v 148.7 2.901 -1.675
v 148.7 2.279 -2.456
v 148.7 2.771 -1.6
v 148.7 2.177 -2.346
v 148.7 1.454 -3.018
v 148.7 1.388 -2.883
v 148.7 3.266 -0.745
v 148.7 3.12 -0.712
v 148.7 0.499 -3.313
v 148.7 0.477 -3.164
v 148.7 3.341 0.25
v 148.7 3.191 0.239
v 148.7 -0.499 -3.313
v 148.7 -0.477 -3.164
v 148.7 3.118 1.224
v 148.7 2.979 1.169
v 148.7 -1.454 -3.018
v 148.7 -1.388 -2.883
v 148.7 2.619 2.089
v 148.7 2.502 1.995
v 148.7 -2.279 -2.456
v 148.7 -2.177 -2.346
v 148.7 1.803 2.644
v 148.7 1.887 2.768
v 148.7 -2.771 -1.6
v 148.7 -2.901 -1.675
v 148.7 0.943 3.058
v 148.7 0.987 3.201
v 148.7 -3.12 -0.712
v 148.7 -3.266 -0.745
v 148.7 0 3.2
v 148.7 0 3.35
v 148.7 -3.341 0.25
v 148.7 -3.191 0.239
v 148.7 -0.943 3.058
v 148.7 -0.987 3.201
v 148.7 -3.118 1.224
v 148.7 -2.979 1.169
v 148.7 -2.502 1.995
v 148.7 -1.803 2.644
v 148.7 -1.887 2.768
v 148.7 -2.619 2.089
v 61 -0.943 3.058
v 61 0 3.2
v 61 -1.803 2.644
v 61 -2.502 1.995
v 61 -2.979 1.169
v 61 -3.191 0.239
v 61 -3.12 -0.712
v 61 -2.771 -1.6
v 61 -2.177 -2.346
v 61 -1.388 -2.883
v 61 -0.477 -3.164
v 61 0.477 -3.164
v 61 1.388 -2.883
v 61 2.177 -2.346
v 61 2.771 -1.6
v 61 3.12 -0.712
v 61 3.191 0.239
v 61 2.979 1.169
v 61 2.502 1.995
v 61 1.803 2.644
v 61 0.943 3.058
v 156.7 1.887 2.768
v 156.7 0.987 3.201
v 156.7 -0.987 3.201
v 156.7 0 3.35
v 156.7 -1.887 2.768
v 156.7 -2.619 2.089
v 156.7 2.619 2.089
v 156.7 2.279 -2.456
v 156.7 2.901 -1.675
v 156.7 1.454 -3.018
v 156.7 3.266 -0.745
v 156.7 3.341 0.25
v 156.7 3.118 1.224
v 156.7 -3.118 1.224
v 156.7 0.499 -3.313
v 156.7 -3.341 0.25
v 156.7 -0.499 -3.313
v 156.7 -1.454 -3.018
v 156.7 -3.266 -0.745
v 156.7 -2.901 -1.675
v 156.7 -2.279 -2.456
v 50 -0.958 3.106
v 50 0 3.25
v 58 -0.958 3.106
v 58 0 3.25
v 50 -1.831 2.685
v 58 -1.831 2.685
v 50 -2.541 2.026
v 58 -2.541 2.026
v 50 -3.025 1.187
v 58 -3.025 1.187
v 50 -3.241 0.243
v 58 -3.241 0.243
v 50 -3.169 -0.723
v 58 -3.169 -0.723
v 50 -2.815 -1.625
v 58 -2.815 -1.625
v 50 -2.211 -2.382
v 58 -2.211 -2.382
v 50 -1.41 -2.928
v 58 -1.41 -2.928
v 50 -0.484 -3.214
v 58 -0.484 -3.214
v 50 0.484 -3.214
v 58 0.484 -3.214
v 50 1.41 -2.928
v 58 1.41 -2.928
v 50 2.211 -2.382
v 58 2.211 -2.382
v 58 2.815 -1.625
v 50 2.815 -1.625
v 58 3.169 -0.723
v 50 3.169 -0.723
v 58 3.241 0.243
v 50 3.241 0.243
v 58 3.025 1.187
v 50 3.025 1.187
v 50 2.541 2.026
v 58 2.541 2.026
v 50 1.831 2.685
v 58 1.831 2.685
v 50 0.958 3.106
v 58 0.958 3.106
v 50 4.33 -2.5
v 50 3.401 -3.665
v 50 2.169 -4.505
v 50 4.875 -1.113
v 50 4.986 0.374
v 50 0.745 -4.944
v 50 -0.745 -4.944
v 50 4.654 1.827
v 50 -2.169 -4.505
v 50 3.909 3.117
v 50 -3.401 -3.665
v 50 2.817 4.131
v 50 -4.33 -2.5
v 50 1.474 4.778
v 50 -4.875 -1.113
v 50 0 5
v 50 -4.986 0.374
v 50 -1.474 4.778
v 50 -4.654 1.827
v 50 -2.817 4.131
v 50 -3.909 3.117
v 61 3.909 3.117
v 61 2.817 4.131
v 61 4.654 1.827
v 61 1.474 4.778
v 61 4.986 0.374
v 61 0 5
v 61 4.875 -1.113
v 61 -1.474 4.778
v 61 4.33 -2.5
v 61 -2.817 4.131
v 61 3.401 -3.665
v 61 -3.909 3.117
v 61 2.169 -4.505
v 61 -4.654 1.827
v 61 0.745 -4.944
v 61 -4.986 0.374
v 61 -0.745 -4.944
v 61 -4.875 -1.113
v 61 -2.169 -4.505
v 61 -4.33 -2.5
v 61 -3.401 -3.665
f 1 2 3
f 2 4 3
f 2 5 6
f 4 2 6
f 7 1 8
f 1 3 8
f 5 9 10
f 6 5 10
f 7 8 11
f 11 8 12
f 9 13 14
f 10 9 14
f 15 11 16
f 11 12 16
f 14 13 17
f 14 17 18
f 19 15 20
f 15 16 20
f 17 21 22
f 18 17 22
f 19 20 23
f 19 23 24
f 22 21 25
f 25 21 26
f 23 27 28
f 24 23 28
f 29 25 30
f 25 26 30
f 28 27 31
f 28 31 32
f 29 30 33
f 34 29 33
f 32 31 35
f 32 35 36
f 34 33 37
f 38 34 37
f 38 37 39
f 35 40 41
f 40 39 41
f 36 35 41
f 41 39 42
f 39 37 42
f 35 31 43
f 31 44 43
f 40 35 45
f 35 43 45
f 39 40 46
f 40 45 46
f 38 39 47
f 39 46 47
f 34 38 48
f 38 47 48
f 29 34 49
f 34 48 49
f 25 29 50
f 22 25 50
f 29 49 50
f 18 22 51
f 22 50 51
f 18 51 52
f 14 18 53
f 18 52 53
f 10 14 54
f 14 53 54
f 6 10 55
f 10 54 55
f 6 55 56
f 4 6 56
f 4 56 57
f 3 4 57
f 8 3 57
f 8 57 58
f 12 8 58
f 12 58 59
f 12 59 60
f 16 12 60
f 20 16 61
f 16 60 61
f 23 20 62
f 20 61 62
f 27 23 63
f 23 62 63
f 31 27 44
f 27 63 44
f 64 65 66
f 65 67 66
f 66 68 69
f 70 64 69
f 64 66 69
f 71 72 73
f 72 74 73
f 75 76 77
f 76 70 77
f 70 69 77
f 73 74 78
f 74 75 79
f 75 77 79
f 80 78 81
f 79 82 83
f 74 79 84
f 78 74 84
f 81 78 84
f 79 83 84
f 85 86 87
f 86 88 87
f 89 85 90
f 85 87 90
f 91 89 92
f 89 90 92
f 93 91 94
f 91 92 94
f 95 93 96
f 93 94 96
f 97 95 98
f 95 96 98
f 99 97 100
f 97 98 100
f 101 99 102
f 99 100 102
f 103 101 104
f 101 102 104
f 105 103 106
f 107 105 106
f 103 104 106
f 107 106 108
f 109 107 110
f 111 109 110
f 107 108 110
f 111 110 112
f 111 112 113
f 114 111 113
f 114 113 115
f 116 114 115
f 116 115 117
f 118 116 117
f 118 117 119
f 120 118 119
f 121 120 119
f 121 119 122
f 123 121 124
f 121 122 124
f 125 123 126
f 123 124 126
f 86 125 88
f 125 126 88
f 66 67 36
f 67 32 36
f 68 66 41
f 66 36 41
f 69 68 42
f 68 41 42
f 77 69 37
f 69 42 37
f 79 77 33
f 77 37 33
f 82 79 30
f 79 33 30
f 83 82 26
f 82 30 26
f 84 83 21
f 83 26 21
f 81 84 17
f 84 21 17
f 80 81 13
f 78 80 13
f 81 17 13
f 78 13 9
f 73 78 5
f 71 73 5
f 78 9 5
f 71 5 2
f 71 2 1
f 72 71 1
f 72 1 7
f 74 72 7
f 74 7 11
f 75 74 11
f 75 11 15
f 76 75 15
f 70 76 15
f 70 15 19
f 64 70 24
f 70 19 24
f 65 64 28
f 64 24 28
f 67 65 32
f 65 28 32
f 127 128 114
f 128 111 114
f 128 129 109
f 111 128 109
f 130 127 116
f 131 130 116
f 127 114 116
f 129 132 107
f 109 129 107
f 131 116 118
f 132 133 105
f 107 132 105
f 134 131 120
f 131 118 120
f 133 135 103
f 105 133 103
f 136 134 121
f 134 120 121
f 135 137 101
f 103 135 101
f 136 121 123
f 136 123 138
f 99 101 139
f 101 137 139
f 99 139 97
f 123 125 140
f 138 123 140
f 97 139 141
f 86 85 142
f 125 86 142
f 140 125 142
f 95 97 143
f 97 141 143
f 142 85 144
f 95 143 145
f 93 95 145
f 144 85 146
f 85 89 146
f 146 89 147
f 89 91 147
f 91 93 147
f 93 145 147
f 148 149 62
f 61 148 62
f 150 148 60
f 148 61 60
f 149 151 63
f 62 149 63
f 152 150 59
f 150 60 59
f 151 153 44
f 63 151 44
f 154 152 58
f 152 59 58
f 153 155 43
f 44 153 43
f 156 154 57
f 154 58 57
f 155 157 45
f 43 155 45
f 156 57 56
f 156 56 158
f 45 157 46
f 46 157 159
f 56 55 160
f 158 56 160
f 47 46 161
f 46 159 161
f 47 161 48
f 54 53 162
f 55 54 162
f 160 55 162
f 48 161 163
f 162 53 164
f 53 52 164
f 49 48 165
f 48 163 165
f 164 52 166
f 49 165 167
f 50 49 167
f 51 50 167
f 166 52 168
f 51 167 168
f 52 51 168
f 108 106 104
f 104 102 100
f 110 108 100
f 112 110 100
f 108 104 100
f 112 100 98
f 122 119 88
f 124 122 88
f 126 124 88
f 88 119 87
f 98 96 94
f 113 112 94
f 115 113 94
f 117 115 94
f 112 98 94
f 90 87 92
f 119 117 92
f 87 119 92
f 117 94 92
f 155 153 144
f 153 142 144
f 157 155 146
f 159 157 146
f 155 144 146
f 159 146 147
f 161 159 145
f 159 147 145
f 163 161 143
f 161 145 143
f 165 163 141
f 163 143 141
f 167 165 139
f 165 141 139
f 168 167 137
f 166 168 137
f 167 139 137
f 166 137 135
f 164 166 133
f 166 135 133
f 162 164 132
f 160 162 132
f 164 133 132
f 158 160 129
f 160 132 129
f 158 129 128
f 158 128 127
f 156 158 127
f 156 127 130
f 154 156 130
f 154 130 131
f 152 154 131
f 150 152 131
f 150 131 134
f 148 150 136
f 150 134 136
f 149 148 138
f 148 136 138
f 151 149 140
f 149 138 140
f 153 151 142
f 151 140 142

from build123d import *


with BuildPart() as part:
    # Axial profile (mm) → Full revolution (revolve)
    with BuildSketch(Plane.XY, mode=Mode.PRIVATE) as full_revolution_sk:
        Polygon((50, 3.25), (58, 3.25), (58, 0), (156.7, 0), (156.7, 3.35), (148.7, 3.35), (148.7, 3.2), (61, 3.2), (61, 5), (50, 5), align=None)
    revolve(full_revolution_sk.sketch.rotate(Axis((-110, 0, 0), (1, 0, 0)), 90), axis=Axis((-110, 0, 0), (1, 0, 0)))


solid = part.part
